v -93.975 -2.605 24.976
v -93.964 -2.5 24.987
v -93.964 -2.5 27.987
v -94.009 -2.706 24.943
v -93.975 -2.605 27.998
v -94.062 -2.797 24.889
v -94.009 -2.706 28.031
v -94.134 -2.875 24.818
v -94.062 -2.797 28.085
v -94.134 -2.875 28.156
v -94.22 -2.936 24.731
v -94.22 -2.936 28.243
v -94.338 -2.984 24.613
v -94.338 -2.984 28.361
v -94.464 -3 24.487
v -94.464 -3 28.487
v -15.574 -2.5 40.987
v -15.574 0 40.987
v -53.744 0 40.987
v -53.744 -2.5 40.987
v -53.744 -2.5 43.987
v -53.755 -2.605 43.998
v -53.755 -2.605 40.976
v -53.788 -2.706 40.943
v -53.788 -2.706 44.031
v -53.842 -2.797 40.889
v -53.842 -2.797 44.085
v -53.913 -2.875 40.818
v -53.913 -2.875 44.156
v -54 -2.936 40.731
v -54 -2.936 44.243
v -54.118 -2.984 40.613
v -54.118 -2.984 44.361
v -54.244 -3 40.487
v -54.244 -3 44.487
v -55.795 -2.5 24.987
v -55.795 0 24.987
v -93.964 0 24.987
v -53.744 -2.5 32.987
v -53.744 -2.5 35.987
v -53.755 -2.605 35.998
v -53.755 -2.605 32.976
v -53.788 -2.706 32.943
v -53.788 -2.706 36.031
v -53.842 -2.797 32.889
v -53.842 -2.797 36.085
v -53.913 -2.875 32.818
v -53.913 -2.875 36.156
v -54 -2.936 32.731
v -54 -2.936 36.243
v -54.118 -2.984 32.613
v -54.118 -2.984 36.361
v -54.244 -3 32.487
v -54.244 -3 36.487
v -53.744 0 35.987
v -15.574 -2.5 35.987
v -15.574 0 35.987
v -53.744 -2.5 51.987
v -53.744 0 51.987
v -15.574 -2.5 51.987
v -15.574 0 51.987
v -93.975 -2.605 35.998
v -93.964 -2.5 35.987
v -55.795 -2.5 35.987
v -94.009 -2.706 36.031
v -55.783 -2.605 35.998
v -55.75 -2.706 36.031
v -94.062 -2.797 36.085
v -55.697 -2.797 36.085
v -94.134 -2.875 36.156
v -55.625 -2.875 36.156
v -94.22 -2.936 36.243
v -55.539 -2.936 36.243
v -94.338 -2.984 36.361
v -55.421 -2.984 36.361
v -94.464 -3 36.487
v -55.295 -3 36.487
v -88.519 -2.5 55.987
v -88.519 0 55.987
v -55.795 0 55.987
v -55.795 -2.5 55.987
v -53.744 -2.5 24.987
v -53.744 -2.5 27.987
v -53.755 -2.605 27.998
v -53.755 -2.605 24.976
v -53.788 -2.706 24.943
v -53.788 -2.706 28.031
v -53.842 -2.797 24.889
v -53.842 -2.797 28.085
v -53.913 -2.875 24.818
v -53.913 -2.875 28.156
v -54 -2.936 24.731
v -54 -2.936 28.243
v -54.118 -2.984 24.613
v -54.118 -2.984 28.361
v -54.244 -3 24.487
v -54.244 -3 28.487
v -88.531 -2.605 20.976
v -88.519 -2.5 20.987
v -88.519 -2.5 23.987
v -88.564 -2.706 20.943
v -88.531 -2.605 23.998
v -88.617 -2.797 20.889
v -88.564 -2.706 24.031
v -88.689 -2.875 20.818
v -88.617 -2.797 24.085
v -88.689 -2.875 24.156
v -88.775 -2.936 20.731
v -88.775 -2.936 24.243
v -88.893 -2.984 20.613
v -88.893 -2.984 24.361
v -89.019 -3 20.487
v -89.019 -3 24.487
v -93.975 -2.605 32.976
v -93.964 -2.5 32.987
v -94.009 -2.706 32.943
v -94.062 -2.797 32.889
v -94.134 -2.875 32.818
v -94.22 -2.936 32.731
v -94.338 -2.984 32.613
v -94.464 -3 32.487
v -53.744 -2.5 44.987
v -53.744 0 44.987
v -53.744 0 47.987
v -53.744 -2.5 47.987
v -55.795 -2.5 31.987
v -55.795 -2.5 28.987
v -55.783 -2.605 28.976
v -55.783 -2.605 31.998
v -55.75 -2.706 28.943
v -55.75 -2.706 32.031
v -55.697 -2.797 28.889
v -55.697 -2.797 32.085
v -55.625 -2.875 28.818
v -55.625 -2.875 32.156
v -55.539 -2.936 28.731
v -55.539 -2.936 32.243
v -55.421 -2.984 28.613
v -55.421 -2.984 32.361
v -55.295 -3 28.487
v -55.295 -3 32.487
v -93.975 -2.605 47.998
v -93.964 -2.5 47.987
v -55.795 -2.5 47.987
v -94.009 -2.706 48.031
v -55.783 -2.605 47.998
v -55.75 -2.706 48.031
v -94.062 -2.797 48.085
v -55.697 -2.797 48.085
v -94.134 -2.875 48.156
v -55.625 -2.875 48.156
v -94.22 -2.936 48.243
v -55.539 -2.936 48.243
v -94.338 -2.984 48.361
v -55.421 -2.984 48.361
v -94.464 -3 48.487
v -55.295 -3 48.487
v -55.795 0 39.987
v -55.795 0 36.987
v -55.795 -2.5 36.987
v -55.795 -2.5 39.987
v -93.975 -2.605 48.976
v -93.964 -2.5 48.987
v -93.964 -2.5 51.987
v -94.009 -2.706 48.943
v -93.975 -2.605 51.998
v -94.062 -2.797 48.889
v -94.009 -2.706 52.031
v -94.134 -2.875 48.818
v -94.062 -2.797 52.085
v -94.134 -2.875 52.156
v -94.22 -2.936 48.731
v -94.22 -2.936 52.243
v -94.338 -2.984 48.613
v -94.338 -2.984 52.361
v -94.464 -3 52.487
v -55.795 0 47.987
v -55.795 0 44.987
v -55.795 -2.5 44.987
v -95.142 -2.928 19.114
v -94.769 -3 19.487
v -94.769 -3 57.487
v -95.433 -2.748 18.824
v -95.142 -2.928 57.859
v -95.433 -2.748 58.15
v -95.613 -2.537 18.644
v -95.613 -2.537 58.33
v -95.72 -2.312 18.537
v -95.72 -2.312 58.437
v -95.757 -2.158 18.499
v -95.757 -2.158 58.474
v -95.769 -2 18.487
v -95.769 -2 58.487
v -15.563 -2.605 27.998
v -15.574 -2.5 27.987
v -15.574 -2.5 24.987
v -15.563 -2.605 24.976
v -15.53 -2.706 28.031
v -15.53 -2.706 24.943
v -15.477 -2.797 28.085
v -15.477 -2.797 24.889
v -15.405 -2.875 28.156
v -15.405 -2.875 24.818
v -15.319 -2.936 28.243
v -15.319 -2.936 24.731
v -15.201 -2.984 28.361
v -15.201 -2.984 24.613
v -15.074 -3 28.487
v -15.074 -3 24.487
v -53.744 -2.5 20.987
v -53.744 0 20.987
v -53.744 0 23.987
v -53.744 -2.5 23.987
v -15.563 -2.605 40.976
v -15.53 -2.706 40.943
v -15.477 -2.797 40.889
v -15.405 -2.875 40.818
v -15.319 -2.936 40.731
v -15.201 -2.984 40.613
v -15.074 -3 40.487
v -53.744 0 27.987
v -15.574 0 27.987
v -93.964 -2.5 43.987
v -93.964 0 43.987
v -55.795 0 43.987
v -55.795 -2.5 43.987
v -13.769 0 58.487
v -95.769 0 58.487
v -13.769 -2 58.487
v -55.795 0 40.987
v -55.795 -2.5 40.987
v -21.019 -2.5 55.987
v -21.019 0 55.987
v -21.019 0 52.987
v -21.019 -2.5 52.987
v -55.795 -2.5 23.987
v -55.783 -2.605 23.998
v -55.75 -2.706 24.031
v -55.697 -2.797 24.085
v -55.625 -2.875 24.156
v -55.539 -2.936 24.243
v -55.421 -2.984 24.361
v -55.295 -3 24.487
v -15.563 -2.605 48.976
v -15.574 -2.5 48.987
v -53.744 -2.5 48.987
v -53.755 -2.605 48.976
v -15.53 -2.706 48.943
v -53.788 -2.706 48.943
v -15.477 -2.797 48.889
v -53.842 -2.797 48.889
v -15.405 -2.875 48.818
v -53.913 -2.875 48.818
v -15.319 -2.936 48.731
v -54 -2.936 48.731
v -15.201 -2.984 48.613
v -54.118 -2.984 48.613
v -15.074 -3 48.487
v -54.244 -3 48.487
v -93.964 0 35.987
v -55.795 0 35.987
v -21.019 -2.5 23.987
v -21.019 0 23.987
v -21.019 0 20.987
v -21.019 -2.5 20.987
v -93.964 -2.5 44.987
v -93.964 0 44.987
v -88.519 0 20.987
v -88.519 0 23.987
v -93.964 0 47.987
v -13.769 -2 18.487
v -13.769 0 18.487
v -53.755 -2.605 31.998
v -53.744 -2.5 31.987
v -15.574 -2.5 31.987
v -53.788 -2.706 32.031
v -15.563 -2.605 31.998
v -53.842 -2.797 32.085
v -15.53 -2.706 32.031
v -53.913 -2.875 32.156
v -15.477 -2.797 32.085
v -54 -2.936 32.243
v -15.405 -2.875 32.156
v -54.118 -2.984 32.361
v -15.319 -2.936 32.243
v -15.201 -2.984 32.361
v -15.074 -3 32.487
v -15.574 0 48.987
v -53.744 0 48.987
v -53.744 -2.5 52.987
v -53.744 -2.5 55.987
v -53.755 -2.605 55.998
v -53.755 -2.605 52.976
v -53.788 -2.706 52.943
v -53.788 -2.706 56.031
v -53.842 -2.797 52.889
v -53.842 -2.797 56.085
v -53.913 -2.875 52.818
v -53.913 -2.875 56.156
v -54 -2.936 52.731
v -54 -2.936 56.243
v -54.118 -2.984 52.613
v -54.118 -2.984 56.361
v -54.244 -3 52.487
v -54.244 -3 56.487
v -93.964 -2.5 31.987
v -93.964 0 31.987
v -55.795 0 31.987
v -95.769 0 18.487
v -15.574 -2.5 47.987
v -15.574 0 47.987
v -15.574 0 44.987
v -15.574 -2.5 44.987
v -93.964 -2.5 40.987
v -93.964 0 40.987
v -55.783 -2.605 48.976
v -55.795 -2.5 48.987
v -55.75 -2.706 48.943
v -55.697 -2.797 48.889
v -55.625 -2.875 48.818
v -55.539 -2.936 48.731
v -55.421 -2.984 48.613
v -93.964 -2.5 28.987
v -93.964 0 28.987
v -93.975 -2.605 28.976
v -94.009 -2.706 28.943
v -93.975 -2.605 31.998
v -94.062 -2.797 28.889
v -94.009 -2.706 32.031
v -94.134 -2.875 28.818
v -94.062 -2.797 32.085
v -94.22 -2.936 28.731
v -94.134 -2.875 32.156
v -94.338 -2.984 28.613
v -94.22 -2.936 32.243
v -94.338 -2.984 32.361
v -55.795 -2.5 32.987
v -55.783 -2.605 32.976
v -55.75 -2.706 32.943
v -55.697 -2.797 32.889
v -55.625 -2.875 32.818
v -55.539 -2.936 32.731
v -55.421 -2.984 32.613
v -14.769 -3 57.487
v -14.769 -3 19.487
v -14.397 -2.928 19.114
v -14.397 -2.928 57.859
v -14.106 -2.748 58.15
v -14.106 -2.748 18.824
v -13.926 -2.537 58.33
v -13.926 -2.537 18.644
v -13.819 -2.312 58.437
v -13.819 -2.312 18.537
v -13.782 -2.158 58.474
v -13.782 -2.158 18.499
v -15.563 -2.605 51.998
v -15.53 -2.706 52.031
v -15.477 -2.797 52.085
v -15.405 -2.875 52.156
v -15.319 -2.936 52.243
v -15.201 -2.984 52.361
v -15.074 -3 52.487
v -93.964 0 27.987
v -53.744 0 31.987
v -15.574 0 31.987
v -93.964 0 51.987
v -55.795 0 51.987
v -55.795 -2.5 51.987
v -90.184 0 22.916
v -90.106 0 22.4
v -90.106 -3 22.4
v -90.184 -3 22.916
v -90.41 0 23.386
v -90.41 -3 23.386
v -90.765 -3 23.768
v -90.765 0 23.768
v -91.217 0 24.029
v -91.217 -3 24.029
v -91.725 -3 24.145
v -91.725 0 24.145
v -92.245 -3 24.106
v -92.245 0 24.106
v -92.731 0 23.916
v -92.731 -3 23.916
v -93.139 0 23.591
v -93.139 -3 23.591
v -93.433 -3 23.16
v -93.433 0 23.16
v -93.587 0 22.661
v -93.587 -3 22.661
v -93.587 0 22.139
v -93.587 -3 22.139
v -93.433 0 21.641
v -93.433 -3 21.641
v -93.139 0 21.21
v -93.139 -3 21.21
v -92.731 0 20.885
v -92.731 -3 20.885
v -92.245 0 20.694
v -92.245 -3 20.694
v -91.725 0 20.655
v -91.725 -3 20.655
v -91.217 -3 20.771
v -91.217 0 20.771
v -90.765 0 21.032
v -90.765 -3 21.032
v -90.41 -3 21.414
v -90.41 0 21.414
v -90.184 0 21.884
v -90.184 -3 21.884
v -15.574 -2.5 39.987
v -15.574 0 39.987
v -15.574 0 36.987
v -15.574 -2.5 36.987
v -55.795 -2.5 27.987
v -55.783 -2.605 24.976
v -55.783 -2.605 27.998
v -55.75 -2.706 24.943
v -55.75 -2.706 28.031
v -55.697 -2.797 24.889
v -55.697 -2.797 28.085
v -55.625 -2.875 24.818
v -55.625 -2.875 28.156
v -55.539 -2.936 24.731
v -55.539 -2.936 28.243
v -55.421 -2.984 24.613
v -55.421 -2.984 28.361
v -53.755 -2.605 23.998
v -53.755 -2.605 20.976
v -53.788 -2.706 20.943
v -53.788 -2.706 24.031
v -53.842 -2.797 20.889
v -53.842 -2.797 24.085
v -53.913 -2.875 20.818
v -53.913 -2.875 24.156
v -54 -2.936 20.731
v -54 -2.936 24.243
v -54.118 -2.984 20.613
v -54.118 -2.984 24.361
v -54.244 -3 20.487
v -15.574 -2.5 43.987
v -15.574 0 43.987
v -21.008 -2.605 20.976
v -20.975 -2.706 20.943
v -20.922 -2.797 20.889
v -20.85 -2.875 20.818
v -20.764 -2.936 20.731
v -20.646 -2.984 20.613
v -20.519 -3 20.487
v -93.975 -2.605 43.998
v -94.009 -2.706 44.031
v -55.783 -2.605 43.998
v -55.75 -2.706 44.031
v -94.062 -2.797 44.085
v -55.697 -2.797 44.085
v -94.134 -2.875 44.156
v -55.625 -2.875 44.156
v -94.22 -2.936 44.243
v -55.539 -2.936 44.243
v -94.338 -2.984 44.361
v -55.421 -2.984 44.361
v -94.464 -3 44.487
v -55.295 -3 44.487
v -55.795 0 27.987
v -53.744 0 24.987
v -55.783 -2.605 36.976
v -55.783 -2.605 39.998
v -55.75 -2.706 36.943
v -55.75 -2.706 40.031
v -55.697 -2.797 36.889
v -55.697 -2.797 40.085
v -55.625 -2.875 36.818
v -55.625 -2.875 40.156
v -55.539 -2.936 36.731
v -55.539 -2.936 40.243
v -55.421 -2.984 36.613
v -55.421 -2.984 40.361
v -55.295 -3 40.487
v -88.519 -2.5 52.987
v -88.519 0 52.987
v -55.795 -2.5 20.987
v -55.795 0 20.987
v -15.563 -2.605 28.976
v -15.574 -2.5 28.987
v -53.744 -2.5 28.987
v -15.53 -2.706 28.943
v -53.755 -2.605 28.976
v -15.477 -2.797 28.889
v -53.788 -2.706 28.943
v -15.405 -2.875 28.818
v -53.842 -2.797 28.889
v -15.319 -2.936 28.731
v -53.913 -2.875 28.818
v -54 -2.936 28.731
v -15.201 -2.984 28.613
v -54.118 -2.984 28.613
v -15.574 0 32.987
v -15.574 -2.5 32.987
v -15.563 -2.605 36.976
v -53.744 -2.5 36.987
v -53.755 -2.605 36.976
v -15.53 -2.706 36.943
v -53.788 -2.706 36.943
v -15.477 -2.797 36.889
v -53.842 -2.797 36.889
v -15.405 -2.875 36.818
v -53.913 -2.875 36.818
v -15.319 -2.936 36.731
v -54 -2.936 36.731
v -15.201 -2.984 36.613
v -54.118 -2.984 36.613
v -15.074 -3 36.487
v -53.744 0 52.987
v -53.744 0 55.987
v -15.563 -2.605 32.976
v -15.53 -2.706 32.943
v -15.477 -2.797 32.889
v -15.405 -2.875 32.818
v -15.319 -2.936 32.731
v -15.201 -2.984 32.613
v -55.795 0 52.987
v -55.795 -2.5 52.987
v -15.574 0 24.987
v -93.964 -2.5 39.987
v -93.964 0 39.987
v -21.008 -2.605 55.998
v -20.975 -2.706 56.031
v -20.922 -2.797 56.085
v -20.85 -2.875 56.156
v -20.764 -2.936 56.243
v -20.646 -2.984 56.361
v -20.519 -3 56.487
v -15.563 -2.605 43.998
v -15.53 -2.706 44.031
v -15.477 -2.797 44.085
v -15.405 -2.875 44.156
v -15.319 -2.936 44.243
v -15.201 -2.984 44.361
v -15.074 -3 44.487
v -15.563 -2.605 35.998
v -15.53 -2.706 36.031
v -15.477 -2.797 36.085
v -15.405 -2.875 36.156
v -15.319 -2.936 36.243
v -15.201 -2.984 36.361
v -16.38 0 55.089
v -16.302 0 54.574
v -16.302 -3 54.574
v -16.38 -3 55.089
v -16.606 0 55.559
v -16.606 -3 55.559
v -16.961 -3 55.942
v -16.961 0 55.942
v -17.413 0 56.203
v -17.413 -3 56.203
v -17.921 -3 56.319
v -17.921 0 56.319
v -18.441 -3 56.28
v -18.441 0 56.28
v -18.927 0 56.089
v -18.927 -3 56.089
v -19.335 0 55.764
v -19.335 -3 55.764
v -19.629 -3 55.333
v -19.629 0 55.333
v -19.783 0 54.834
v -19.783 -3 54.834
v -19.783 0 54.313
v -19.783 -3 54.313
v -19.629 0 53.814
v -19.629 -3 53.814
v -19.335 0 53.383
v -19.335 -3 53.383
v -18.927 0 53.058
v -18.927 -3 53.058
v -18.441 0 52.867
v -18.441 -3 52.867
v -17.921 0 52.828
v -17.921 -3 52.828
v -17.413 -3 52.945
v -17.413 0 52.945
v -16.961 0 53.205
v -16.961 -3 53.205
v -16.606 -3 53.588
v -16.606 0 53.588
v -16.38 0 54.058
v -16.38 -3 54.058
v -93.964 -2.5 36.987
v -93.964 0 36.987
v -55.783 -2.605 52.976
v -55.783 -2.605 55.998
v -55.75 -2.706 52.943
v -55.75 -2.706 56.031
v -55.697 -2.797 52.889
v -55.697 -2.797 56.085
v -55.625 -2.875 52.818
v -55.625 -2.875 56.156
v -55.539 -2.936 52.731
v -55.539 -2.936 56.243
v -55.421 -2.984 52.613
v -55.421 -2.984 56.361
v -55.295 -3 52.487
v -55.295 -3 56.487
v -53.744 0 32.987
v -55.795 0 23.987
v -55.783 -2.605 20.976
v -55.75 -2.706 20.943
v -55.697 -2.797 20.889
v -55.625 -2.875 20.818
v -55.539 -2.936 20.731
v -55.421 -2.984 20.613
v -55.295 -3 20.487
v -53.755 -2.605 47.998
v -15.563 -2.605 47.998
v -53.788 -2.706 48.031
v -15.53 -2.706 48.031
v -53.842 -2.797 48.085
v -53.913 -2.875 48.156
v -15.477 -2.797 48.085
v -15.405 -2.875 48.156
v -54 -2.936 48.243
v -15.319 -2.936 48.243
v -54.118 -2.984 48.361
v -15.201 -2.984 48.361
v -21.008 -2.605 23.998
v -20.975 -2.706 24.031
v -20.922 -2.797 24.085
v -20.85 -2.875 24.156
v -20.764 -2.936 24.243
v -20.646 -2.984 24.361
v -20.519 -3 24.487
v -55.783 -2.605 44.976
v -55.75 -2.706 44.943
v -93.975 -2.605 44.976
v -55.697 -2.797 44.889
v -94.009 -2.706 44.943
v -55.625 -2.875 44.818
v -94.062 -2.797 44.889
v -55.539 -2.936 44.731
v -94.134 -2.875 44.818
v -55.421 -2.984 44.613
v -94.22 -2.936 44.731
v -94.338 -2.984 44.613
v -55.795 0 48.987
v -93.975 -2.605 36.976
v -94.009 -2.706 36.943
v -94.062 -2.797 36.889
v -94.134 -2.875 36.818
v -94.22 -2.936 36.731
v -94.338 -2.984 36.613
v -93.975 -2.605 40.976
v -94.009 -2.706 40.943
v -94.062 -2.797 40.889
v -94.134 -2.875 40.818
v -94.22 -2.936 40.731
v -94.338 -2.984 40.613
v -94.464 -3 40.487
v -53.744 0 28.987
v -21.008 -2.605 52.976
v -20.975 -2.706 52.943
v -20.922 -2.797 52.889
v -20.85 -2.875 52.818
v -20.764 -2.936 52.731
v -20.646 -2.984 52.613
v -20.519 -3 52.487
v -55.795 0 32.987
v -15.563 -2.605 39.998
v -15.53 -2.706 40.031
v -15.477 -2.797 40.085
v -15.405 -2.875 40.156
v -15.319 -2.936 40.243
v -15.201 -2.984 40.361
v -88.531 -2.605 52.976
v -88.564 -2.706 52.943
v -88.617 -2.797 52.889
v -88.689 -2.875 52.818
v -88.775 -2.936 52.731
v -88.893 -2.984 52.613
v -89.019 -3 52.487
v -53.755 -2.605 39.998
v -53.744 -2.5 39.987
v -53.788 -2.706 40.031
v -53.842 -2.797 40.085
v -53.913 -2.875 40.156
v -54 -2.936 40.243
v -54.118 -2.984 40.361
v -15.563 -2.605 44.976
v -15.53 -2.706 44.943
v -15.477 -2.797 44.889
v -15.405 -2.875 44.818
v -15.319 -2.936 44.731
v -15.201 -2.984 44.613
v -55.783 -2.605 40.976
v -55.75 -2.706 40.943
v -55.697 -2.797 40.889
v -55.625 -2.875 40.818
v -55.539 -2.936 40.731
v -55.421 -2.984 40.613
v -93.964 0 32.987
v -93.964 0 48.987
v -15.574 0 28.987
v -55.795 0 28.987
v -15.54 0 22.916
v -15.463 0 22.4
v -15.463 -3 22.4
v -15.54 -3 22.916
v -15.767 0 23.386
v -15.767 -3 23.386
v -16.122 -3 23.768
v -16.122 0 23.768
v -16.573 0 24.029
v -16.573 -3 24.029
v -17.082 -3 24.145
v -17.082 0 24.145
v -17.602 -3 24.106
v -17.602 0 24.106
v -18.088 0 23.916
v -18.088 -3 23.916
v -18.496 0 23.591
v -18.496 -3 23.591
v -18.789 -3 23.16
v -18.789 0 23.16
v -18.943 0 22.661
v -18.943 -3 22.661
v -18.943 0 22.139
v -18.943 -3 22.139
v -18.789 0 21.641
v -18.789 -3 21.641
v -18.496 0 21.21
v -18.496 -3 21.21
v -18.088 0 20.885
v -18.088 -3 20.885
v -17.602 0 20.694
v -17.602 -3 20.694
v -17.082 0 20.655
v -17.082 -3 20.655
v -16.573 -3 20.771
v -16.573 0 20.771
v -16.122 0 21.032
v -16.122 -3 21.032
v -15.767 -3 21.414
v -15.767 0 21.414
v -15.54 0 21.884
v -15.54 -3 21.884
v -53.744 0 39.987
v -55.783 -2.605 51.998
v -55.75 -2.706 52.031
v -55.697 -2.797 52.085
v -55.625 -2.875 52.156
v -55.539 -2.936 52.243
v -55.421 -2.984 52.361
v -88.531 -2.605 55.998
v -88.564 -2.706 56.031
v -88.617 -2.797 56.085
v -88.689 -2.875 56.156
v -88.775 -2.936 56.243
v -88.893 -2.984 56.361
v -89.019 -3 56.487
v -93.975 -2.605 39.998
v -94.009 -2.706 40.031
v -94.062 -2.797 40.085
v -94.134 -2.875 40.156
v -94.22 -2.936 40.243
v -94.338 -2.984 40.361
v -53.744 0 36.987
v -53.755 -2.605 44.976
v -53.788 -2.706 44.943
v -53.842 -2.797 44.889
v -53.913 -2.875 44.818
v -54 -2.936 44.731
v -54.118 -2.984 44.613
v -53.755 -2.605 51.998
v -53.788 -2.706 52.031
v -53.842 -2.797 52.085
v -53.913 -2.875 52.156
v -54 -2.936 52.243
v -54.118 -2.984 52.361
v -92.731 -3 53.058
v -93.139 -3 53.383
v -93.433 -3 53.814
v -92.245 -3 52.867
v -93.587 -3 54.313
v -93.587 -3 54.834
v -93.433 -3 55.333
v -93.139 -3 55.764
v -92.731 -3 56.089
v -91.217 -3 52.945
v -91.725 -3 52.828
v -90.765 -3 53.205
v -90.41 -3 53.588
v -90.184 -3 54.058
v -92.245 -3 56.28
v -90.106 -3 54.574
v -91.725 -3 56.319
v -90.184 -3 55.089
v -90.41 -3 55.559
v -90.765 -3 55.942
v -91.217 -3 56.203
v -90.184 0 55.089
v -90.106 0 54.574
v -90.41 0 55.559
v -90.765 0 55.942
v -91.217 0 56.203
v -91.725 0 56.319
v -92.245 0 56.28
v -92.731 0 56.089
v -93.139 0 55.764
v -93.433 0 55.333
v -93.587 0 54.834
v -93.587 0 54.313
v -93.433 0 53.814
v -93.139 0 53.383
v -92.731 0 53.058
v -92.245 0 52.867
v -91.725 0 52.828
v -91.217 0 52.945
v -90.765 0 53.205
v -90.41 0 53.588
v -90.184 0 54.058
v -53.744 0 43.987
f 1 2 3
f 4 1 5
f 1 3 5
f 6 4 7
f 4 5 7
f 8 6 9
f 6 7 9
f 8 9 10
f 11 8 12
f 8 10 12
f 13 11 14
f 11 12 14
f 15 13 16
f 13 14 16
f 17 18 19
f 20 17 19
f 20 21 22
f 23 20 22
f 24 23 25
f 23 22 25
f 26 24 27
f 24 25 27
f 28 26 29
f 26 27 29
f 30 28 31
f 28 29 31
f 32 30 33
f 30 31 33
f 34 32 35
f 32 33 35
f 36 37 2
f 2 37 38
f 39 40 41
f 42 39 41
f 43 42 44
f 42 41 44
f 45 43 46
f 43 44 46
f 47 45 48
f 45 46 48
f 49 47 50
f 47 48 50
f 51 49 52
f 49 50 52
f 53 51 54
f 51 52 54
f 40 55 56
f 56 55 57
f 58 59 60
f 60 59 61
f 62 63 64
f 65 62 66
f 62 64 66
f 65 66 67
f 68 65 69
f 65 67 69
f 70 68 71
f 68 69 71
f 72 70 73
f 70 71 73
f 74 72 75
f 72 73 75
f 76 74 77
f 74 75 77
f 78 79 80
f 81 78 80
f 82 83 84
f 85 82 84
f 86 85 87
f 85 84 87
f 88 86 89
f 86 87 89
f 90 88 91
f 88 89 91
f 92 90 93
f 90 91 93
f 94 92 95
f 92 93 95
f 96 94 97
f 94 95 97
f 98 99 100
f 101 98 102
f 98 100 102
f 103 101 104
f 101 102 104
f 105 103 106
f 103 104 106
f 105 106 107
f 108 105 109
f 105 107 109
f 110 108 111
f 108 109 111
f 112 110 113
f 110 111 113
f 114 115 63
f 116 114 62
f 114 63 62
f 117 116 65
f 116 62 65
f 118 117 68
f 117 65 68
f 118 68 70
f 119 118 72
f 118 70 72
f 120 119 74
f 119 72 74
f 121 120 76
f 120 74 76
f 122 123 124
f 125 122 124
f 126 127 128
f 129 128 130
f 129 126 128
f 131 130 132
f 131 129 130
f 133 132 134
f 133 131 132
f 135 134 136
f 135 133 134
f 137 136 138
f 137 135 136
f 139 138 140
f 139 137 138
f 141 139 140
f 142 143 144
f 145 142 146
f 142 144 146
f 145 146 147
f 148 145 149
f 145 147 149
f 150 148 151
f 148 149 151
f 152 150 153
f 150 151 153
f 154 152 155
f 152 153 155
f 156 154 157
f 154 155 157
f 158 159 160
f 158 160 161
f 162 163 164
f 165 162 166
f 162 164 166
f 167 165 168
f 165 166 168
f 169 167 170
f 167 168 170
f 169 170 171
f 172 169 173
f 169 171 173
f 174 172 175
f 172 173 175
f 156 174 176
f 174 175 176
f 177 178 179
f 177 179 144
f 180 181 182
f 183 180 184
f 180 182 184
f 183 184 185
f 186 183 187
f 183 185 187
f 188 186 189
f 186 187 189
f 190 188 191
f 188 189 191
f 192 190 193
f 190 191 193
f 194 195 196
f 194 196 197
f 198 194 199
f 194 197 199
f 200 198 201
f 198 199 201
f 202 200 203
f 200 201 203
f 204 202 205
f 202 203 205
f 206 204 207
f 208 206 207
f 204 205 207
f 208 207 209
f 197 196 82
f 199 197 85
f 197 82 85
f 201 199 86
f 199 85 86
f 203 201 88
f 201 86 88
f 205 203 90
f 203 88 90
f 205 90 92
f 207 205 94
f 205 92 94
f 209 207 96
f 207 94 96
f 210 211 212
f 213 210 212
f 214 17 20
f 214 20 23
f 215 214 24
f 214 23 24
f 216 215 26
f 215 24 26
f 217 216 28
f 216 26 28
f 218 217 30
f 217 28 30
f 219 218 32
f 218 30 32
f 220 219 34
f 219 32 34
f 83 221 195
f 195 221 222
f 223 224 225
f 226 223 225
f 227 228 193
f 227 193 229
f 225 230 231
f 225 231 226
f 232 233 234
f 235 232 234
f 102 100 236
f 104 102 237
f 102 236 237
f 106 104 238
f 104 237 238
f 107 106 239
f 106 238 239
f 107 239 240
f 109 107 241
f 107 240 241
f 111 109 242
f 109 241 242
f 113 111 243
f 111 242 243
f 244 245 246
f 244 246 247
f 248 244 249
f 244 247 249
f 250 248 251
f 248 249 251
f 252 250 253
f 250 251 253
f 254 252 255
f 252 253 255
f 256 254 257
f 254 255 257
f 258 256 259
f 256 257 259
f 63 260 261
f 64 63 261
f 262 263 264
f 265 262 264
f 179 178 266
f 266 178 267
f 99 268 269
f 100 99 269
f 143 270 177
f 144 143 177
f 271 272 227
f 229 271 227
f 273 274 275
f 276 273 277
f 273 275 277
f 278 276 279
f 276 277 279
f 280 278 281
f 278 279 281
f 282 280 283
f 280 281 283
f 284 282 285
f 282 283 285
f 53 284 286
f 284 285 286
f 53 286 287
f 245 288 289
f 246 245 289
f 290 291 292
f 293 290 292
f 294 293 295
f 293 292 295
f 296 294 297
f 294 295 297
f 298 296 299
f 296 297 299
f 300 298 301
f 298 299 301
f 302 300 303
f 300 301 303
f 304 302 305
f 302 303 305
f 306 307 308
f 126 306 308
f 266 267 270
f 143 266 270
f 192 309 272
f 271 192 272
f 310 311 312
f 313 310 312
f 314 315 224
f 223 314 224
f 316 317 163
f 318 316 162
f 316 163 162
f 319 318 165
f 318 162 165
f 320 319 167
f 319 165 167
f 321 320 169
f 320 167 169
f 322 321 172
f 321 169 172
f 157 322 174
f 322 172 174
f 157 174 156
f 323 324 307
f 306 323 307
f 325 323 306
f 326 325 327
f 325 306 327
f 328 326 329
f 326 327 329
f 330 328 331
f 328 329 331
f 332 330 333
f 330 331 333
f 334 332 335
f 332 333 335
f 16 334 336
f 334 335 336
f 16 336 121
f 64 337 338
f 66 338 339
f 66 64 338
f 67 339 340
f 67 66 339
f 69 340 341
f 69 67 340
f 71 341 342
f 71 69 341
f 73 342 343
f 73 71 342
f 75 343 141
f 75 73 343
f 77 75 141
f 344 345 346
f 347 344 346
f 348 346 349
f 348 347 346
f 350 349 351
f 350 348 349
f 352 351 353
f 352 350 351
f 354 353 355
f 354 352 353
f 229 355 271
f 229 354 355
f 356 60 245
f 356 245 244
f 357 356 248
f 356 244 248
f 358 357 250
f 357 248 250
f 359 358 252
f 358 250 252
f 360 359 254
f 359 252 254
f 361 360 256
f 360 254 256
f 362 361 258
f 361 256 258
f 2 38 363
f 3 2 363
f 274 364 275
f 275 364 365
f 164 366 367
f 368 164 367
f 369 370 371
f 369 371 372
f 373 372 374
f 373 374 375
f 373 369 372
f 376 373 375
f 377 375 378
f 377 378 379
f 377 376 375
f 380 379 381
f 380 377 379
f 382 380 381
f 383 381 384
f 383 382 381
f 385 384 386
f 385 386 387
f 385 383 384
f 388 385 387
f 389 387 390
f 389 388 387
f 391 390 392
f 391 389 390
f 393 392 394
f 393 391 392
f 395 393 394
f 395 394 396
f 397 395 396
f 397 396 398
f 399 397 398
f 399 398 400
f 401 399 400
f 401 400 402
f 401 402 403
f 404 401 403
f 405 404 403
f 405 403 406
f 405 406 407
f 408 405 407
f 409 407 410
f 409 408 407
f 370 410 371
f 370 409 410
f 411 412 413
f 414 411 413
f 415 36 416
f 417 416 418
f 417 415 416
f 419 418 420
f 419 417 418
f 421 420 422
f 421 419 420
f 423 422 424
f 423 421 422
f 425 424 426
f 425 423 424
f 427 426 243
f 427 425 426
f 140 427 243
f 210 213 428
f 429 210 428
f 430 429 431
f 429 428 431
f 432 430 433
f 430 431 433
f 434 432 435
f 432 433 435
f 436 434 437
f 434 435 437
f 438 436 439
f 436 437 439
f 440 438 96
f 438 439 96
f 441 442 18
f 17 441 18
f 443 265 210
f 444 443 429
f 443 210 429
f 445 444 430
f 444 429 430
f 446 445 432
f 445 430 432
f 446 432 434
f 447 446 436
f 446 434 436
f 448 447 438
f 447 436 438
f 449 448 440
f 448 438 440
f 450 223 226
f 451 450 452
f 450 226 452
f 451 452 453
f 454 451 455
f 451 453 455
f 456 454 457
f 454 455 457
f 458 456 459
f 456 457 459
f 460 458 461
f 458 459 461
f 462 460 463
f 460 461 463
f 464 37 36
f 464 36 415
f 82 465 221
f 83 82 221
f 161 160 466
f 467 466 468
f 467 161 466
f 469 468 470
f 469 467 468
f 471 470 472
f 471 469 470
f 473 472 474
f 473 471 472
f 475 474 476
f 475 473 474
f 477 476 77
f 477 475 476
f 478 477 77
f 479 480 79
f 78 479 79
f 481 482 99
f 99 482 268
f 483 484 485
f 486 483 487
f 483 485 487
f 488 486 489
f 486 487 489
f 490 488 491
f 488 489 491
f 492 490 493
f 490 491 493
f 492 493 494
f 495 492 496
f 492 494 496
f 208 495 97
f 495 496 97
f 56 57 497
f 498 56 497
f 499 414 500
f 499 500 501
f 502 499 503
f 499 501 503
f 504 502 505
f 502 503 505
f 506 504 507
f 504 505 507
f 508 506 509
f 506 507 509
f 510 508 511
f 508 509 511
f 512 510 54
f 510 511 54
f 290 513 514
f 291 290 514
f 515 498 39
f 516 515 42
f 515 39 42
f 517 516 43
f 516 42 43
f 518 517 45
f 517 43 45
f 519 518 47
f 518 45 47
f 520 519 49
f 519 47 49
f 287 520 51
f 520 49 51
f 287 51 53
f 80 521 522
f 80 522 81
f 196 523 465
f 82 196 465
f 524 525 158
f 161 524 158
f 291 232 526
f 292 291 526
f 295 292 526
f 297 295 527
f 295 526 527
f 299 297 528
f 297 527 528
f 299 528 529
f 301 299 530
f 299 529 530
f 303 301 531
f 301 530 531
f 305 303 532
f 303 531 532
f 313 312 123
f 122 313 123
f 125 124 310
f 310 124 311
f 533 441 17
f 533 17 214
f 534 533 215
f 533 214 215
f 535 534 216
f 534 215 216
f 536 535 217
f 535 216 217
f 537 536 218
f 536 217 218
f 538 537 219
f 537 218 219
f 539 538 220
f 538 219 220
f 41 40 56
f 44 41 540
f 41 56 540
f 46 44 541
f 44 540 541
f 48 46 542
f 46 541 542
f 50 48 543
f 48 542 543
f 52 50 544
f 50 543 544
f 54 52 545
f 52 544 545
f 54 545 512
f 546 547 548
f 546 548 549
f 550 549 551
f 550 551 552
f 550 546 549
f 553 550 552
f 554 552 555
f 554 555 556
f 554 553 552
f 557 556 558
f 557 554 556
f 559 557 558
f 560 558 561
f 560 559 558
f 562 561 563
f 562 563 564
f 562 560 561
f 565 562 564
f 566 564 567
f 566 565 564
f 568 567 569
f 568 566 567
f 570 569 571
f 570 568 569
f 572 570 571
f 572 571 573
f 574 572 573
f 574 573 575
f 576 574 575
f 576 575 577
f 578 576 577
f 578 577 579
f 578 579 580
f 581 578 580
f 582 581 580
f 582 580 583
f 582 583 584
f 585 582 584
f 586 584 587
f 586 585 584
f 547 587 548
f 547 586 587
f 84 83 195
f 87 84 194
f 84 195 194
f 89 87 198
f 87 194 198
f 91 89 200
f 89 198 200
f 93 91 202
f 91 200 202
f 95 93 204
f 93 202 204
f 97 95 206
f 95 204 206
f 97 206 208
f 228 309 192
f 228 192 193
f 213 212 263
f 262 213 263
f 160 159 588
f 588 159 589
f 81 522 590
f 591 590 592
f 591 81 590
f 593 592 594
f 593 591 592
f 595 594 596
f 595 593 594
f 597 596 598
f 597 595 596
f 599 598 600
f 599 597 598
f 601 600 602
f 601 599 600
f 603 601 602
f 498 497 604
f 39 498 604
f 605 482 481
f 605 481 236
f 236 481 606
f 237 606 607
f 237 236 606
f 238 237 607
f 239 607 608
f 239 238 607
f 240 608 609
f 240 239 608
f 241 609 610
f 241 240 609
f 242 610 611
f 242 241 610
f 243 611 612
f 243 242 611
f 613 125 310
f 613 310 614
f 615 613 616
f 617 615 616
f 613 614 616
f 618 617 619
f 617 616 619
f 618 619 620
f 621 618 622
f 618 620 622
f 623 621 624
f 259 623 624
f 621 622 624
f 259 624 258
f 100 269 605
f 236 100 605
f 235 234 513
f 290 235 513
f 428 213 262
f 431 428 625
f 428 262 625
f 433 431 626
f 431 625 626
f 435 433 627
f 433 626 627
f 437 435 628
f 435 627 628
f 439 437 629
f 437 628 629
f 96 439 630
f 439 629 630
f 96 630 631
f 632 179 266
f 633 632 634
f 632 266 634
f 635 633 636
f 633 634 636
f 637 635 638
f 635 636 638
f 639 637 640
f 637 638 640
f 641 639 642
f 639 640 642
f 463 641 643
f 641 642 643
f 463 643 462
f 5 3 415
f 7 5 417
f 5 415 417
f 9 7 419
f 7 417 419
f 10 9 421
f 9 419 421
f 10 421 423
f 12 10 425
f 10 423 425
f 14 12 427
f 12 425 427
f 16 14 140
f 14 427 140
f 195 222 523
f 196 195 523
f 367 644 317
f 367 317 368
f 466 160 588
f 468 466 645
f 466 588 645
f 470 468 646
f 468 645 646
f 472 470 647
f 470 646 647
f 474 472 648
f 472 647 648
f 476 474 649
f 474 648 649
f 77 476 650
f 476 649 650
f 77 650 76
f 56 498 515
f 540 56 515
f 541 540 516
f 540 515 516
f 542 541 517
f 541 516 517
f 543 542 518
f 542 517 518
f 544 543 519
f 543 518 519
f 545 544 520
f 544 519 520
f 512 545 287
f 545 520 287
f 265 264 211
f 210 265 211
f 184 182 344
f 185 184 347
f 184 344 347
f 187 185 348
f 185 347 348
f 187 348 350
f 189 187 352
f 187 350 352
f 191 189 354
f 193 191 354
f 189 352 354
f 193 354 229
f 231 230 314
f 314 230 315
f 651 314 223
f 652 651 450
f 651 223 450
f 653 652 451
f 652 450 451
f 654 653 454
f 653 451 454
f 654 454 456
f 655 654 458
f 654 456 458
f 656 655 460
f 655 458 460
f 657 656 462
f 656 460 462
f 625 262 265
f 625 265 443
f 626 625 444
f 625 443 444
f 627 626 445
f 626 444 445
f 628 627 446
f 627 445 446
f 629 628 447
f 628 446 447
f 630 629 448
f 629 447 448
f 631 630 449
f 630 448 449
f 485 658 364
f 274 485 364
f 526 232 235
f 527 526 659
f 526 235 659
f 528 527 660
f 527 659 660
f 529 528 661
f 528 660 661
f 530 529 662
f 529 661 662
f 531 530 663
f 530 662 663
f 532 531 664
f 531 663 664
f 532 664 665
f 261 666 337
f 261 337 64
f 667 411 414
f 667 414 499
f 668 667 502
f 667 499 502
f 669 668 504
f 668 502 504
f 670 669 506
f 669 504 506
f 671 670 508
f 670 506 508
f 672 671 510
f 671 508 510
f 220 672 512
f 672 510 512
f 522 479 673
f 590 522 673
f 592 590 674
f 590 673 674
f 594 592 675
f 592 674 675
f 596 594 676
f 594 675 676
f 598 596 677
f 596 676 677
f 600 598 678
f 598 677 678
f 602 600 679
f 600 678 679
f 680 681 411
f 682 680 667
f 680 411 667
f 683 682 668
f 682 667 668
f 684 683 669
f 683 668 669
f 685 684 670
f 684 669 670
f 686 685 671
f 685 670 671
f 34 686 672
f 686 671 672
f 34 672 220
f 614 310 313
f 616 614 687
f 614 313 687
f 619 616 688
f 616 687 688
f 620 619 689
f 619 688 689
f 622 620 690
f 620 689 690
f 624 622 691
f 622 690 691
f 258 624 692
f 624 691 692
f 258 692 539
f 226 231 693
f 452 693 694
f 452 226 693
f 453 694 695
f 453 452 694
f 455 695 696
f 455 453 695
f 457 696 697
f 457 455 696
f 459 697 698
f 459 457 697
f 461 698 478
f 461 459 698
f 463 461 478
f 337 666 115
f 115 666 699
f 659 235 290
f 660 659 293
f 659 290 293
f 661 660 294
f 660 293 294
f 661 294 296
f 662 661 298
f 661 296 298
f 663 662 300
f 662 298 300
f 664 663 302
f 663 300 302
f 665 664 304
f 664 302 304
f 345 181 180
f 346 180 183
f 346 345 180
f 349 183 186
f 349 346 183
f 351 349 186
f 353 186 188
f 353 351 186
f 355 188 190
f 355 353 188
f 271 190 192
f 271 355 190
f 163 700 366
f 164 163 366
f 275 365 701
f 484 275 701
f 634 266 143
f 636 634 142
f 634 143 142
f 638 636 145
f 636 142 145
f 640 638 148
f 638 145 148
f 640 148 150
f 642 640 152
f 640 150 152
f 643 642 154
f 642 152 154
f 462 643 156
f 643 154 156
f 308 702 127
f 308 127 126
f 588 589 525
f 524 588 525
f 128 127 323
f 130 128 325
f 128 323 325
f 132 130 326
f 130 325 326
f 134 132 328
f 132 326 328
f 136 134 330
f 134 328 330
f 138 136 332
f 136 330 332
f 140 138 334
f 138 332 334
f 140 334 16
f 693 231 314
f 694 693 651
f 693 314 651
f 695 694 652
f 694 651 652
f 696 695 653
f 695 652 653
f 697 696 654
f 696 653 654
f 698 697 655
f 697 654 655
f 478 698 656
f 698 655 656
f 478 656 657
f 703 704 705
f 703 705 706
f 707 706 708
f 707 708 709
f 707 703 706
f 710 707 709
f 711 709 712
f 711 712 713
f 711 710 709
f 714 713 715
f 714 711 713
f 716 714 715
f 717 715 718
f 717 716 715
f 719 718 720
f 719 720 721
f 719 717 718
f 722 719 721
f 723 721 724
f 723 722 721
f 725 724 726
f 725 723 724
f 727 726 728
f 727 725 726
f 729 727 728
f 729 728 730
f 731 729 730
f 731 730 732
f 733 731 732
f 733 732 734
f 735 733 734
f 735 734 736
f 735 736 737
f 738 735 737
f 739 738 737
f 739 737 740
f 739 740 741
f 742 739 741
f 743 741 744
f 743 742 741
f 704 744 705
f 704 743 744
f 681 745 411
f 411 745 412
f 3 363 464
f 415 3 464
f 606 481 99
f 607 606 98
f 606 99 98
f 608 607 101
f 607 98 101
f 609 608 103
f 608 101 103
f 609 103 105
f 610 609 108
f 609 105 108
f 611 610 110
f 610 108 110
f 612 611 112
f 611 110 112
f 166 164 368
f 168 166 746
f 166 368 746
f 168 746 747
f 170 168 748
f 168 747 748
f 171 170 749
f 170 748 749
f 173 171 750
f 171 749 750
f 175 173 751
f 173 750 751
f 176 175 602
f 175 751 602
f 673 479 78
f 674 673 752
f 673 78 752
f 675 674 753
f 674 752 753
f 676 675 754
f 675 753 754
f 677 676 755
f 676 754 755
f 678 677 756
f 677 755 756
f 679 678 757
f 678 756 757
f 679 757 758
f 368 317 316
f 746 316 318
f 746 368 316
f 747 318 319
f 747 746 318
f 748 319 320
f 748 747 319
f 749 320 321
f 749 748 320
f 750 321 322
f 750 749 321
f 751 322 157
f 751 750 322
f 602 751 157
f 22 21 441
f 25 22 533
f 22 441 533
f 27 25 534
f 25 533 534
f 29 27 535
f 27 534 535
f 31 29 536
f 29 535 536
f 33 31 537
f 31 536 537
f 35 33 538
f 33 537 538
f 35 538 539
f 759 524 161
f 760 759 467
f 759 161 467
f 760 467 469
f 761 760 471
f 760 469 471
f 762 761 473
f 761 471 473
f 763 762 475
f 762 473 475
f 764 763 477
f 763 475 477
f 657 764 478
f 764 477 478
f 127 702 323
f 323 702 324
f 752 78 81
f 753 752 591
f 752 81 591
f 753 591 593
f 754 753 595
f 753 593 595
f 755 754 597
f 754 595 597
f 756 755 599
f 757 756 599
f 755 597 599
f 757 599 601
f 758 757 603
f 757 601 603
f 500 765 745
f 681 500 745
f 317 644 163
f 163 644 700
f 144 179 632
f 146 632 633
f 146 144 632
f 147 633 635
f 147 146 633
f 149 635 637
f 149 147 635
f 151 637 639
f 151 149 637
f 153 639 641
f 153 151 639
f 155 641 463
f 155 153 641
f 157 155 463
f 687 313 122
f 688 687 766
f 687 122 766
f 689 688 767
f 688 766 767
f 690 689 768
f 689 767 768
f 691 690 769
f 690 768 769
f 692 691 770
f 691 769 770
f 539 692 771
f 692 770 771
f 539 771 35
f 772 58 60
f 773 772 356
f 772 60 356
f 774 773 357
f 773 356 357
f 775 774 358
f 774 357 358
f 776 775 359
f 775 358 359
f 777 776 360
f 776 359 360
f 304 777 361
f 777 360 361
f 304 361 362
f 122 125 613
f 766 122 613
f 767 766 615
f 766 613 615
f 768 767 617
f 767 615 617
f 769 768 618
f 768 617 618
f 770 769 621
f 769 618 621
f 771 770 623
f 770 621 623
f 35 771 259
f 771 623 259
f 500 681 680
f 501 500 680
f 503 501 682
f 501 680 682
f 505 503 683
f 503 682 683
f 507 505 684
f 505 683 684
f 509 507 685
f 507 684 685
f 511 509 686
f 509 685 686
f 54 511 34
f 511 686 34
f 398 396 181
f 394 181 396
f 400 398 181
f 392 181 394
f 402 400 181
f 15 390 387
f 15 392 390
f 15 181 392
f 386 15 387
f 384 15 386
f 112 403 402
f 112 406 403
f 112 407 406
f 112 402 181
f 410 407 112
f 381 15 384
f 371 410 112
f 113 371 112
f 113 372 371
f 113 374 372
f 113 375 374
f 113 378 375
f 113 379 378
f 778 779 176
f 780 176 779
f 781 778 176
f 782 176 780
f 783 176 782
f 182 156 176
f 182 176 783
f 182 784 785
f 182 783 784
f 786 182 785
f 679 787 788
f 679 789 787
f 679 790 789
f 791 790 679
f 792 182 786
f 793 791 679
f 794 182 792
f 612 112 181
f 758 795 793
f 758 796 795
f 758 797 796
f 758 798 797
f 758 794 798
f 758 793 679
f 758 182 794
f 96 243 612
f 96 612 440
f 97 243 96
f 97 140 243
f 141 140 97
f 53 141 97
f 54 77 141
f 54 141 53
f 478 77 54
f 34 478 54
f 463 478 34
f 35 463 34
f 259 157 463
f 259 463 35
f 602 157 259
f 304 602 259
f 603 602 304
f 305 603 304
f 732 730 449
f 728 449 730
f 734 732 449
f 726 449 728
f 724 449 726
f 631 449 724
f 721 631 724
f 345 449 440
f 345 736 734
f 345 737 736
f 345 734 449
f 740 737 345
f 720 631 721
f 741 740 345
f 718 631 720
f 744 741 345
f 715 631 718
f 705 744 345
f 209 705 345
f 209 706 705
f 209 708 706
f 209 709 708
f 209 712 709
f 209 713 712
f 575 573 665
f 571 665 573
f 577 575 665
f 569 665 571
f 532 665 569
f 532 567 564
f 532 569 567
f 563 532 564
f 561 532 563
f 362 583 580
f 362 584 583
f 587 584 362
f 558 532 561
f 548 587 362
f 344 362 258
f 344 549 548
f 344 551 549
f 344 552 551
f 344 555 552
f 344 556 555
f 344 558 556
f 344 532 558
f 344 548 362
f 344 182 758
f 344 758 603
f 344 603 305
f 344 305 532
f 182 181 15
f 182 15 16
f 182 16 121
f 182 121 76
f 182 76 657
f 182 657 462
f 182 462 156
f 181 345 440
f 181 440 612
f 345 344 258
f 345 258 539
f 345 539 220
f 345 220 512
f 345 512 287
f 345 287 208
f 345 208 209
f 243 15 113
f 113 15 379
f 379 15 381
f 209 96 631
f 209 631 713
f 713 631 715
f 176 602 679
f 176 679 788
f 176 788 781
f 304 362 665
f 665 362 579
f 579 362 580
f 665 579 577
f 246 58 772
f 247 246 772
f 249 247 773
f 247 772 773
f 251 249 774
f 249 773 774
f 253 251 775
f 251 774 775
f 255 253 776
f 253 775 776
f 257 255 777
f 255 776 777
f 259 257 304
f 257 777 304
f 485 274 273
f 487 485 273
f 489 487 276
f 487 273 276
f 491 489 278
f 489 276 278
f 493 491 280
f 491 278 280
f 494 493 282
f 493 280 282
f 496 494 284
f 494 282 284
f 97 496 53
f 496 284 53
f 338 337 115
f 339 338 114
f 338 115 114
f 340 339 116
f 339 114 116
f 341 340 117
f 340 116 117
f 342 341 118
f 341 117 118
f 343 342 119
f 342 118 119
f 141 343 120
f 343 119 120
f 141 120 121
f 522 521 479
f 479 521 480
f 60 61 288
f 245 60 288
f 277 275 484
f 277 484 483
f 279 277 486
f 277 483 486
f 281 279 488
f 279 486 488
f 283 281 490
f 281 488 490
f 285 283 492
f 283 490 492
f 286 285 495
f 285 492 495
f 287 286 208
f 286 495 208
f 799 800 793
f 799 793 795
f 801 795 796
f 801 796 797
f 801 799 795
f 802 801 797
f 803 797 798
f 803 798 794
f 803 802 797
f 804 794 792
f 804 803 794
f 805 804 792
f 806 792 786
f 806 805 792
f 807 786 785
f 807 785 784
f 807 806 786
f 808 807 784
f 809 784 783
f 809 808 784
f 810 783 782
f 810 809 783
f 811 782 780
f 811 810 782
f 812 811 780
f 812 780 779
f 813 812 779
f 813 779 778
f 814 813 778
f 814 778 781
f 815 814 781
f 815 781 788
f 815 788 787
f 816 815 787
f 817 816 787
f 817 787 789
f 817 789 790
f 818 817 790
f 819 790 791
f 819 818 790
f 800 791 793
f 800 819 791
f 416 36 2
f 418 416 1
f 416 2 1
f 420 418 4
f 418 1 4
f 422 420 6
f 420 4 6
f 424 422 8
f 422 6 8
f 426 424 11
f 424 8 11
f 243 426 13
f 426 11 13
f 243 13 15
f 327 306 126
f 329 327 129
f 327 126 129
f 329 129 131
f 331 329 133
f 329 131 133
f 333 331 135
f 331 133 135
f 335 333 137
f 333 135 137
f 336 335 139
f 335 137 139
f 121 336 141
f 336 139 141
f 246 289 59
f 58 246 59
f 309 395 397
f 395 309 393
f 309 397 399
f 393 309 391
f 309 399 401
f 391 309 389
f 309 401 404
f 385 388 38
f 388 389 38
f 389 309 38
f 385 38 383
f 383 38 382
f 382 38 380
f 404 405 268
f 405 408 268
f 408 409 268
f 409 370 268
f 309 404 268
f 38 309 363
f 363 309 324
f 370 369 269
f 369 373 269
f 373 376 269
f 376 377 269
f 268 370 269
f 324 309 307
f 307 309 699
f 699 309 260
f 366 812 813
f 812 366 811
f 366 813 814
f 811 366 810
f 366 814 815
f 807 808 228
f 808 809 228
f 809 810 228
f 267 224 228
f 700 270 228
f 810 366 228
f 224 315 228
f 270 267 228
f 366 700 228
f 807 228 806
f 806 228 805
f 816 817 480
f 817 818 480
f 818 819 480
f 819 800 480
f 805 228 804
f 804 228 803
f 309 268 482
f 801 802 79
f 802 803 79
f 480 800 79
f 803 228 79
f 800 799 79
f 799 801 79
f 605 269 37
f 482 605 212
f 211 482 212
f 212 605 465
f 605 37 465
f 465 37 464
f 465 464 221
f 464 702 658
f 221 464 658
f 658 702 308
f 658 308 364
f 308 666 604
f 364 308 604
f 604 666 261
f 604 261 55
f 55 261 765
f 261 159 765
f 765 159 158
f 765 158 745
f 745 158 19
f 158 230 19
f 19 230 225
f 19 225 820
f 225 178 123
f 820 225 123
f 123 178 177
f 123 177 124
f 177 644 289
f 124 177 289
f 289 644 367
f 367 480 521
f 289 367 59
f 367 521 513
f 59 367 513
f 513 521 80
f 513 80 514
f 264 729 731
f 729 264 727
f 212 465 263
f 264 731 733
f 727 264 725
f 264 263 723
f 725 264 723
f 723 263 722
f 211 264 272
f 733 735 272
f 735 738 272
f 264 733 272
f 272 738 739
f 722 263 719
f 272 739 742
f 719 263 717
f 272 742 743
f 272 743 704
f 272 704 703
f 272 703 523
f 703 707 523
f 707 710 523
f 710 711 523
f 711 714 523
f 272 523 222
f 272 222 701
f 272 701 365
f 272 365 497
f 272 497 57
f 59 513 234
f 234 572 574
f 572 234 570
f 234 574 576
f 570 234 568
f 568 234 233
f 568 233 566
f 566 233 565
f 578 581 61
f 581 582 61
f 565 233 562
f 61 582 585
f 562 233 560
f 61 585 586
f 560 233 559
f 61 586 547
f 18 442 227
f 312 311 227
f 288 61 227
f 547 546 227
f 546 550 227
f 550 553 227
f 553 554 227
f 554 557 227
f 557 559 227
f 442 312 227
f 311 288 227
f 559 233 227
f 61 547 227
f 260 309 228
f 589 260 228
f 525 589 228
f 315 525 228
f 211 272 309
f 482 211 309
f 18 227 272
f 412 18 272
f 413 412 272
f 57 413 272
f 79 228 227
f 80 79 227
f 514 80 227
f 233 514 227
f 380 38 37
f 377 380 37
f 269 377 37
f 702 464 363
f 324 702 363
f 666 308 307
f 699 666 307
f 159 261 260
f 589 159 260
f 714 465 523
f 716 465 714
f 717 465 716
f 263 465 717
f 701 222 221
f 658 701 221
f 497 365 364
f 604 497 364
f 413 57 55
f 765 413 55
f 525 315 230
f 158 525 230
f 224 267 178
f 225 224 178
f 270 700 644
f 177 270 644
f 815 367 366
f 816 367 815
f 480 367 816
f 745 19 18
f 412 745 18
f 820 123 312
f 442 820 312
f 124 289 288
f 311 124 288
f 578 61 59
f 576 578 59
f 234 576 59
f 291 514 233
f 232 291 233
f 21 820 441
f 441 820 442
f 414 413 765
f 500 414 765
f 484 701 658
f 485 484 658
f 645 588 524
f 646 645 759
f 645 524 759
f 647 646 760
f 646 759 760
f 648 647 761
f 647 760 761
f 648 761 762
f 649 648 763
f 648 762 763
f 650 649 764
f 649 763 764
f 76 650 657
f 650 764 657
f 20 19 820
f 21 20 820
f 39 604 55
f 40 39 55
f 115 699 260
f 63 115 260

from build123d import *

# Parameters (mm, degrees)
F0_W     = 82
F0_H     = 40
F0_R     = 1.75
F0_W_2   = 2.0507176579
F0_H_2   = 3
F0_H_3   = 1
F1_DEPTH = 3
F2_R     = 0.49999
F3_R     = 1


# Not quite as in the source:
# - a fillet or chamfer is up to 0.001 mm smaller than in the source, because OpenCascade refuses the exact size


with BuildPart() as f1:
    # F0 (on Front) → F1 (new body)
    with BuildSketch(Plane.XZ):
        with Locations((-54.7693173022, 38.4868923018)):
            Rectangle(F0_W, F0_H)
        with Locations((-91.8560757875, 22.4002130298)):
            Circle(F0_R, mode=Mode.SUBTRACT)
        with Locations((-17.2127172435, 22.4002130298)):
            Circle(F0_R, mode=Mode.SUBTRACT)
        with Locations((-91.8560757875, 54.5735715738)):
            Circle(F0_R, mode=Mode.SUBTRACT)
        Polygon((-53.7439584732, 39.9868923018), (-15.5743994219, 39.9868923018), (-15.5743994219, 36.9868923018), (-53.7439584732, 36.9868923018), (-53.7439584732, 35.9868923018), (-15.5743994219, 35.9868923018), (-15.5743994219, 32.9868923018), (-53.7439584732, 32.9868923018), (-53.7439584732, 31.9868923018), (-15.5743994219, 31.9868923018), (-15.5743994219, 28.9868923018), (-53.7439584732, 28.9868923018), (-53.7439584732, 27.9868923018), (-15.5743994219, 27.9868923018), (-15.5743994219, 24.9868923018), (-53.7439584732, 24.9868923018), (-53.7439584732, 23.9868923018), (-21.0193173022, 23.9868923018), (-21.0193173022, 20.9868923018), (-53.7439584732, 20.9868923018), (-55.7946761312, 20.9868923018), (-88.5193173022, 20.9868923018), (-88.5193173022, 23.9868923018), (-55.7946761312, 23.9868923018), (-55.7946761312, 24.9868923018), (-93.9642351825, 24.9868923018), (-93.9642351825, 27.9868923018), (-55.7946761312, 27.9868923018), (-55.7946761312, 28.9868923018), (-93.9642351825, 28.9868923018), (-93.9642351825, 31.9868923018), (-55.7946761312, 31.9868923018), (-55.7946761312, 32.9868923018), (-93.9642351825, 32.9868923018), (-93.9642351825, 35.9868923018), (-55.7946761312, 35.9868923018), (-55.7946761312, 36.9868923018), (-93.9642351825, 36.9868923018), (-93.9642351825, 39.9868923018), (-55.7946761312, 39.9868923018), (-55.7946761312, 40.9868923018), (-93.9642351825, 40.9868923018), (-93.9642351825, 43.9868923018), (-55.7946761312, 43.9868923018), (-55.7946761312, 44.9868923018), (-93.9642351825, 44.9868923018), (-93.9642351825, 47.9868923018), (-55.7946761312, 47.9868923018), (-55.7946761312, 48.9868923018), (-93.9642351825, 48.9868923018), (-93.9642351825, 51.9868923018), (-55.7946761312, 51.9868923018), (-55.7946761312, 52.9868923018), (-88.5193173022, 52.9868923018), (-88.5193173022, 55.9868923018), (-55.7946761312, 55.9868923018), (-53.7439584732, 55.9868923018), (-21.0193173022, 55.9868923018), (-21.0193173022, 52.9868923018), (-53.7439584732, 52.9868923018), (-53.7439584732, 51.9868923018), (-15.5743994219, 51.9868923018), (-15.5743994219, 48.9868923018), (-53.7439584732, 48.9868923018), (-53.7439584732, 47.9868923018), (-15.5743994219, 47.9868923018), (-15.5743994219, 44.9868923018), (-53.7439584732, 44.9868923018), (-53.7439584732, 43.9868923018), (-15.5743994219, 43.9868923018), (-15.5743994219, 40.9868923018), (-53.7439584732, 40.9868923018), align=None, mode=Mode.SUBTRACT)
        with Locations((-18.0520743152, 54.5735715738)):
            Circle(F0_R, mode=Mode.SUBTRACT)
        with Locations((-54.7693173022, 54.4868923018)):
            Rectangle(F0_W_2, F0_H_2)
        with Locations((-54.7693173022, 52.4868923018)):
            Rectangle(F0_W_2, F0_H_3)
        with Locations((-54.7693173022, 50.4868923018)):
            Rectangle(F0_W_2, F0_H_2)
        with Locations((-54.7693173022, 48.4868923018)):
            Rectangle(F0_W_2, F0_H_3)
        with Locations((-54.7693173022, 46.4868923018)):
            Rectangle(F0_W_2, F0_H_2)
        with Locations((-54.7693173022, 44.4868923018)):
            Rectangle(F0_W_2, F0_H_3)
        with Locations((-54.7693173022, 42.4868923018)):
            Rectangle(F0_W_2, F0_H_2)
        with Locations((-54.7693173022, 40.4868923018)):
            Rectangle(F0_W_2, F0_H_3)
        with Locations((-54.7693173022, 38.4868923018)):
            Rectangle(F0_W_2, F0_H_2)
        with Locations((-54.7693173022, 36.4868923018)):
            Rectangle(F0_W_2, F0_H_3)
        with Locations((-54.7693173022, 34.4868923018)):
            Rectangle(F0_W_2, F0_H_2)
        with Locations((-54.7693173022, 32.4868923018)):
            Rectangle(F0_W_2, F0_H_3)
        with Locations((-54.7693173022, 30.4868923018)):
            Rectangle(F0_W_2, F0_H_2)
        with Locations((-54.7693173022, 28.4868923018)):
            Rectangle(F0_W_2, F0_H_3)
        with Locations((-54.7693173022, 26.4868923018)):
            Rectangle(F0_W_2, F0_H_2)
        with Locations((-54.7693173022, 24.4868923018)):
            Rectangle(F0_W_2, F0_H_3)
        with Locations((-54.7693173022, 22.4868923018)):
            Rectangle(F0_W_2, F0_H_2)
    extrude(amount=F1_DEPTH)

    # F2 (radius 0.5 in the source; OpenCascade refuses exactly that, so slightly less here)
    f2_edges = [f1.edges().sort_by_distance(p)[0] for p in [
        (-72.156997, -3, 20.986892),
        (-72.156997, -3, 23.986892),
        (-74.879456, -3, 24.986892),
        (-74.879456, -3, 27.986892),
        (-74.879456, -3, 28.986892),
        (-74.879456, -3, 31.986892),
        (-74.879456, -3, 32.986892),
        (-74.879456, -3, 35.986892),
        (-74.879456, -3, 36.986892),
        (-37.381638, -3, 20.986892),
        (-37.381638, -3, 23.986892),
        (-34.659179, -3, 24.986892),
        (-34.659179, -3, 27.986892),
        (-34.659179, -3, 28.986892),
        (-34.659179, -3, 31.986892),
        (-34.659179, -3, 32.986892),
        (-34.659179, -3, 35.986892),
        (-34.659179, -3, 36.986892),
        (-74.879456, -3, 39.986892),
        (-74.879456, -3, 40.986892),
        (-74.879456, -3, 43.986892),
        (-74.879456, -3, 44.986892),
        (-74.879456, -3, 47.986892),
        (-74.879456, -3, 48.986892),
        (-74.879456, -3, 51.986892),
        (-72.156997, -3, 52.986892),
        (-93.964235, -3, 26.486892),
        (-93.964235, -3, 30.486892),
        (-93.964235, -3, 34.486892),
        (-88.519317, -3, 22.486892),
        (-55.794676, -3, 22.486892),
        (-55.794676, -3, 26.486892),
        (-55.794676, -3, 30.486892),
        (-55.794676, -3, 34.486892),
        (-55.794676, -3, 38.486892),
        (-55.794676, -3, 42.486892),
        (-55.794676, -3, 46.486892),
        (-55.794676, -3, 50.486892),
        (-55.794676, -3, 54.486892),
        (-72.156997, -3, 55.986892),
        (-53.743958, -3, 22.486892),
        (-53.743958, -3, 26.486892),
        (-53.743958, -3, 30.486892),
        (-53.743958, -3, 34.486892),
        (-53.743958, -3, 38.486892),
        (-34.659179, -3, 39.986892),
        (-34.659179, -3, 40.986892),
        (-53.743958, -3, 42.486892),
        (-34.659179, -3, 43.986892),
        (-34.659179, -3, 44.986892),
        (-53.743958, -3, 46.486892),
        (-34.659179, -3, 48.986892),
        (-34.659179, -3, 47.986892),
        (-53.743958, -3, 50.486892),
        (-34.659179, -3, 51.986892),
        (-37.381638, -3, 52.986892),
        (-53.743958, -3, 54.486892),
        (-37.381638, -3, 55.986892),
        (-93.964235, -3, 38.486892),
        (-93.964235, -3, 42.486892),
        (-93.964235, -3, 46.486892),
        (-93.964235, -3, 50.486892),
        (-88.519317, -3, 54.486892),
        (-21.019317, -3, 22.486892),
        (-15.574399, -3, 26.486892),
        (-15.574399, -3, 30.486892),
        (-15.574399, -3, 34.486892),
        (-15.574399, -3, 38.486892),
        (-15.574399, -3, 42.486892),
        (-15.574399, -3, 46.486892),
        (-15.574399, -3, 50.486892),
        (-21.019317, -3, 54.486892),
    ]]
    fillet(f2_edges, radius=F2_R)

    # F3
    f3_edges = [f1.edges().sort_by_distance(p)[0] for p in [
        (-54.769317, -3, 58.486892),
        (-13.769317, -3, 38.486892),
        (-54.769317, -3, 18.486892),
        (-95.769317, -3, 38.486892),
    ]]
    fillet(f3_edges, radius=F3_R)


solid = f1.part
